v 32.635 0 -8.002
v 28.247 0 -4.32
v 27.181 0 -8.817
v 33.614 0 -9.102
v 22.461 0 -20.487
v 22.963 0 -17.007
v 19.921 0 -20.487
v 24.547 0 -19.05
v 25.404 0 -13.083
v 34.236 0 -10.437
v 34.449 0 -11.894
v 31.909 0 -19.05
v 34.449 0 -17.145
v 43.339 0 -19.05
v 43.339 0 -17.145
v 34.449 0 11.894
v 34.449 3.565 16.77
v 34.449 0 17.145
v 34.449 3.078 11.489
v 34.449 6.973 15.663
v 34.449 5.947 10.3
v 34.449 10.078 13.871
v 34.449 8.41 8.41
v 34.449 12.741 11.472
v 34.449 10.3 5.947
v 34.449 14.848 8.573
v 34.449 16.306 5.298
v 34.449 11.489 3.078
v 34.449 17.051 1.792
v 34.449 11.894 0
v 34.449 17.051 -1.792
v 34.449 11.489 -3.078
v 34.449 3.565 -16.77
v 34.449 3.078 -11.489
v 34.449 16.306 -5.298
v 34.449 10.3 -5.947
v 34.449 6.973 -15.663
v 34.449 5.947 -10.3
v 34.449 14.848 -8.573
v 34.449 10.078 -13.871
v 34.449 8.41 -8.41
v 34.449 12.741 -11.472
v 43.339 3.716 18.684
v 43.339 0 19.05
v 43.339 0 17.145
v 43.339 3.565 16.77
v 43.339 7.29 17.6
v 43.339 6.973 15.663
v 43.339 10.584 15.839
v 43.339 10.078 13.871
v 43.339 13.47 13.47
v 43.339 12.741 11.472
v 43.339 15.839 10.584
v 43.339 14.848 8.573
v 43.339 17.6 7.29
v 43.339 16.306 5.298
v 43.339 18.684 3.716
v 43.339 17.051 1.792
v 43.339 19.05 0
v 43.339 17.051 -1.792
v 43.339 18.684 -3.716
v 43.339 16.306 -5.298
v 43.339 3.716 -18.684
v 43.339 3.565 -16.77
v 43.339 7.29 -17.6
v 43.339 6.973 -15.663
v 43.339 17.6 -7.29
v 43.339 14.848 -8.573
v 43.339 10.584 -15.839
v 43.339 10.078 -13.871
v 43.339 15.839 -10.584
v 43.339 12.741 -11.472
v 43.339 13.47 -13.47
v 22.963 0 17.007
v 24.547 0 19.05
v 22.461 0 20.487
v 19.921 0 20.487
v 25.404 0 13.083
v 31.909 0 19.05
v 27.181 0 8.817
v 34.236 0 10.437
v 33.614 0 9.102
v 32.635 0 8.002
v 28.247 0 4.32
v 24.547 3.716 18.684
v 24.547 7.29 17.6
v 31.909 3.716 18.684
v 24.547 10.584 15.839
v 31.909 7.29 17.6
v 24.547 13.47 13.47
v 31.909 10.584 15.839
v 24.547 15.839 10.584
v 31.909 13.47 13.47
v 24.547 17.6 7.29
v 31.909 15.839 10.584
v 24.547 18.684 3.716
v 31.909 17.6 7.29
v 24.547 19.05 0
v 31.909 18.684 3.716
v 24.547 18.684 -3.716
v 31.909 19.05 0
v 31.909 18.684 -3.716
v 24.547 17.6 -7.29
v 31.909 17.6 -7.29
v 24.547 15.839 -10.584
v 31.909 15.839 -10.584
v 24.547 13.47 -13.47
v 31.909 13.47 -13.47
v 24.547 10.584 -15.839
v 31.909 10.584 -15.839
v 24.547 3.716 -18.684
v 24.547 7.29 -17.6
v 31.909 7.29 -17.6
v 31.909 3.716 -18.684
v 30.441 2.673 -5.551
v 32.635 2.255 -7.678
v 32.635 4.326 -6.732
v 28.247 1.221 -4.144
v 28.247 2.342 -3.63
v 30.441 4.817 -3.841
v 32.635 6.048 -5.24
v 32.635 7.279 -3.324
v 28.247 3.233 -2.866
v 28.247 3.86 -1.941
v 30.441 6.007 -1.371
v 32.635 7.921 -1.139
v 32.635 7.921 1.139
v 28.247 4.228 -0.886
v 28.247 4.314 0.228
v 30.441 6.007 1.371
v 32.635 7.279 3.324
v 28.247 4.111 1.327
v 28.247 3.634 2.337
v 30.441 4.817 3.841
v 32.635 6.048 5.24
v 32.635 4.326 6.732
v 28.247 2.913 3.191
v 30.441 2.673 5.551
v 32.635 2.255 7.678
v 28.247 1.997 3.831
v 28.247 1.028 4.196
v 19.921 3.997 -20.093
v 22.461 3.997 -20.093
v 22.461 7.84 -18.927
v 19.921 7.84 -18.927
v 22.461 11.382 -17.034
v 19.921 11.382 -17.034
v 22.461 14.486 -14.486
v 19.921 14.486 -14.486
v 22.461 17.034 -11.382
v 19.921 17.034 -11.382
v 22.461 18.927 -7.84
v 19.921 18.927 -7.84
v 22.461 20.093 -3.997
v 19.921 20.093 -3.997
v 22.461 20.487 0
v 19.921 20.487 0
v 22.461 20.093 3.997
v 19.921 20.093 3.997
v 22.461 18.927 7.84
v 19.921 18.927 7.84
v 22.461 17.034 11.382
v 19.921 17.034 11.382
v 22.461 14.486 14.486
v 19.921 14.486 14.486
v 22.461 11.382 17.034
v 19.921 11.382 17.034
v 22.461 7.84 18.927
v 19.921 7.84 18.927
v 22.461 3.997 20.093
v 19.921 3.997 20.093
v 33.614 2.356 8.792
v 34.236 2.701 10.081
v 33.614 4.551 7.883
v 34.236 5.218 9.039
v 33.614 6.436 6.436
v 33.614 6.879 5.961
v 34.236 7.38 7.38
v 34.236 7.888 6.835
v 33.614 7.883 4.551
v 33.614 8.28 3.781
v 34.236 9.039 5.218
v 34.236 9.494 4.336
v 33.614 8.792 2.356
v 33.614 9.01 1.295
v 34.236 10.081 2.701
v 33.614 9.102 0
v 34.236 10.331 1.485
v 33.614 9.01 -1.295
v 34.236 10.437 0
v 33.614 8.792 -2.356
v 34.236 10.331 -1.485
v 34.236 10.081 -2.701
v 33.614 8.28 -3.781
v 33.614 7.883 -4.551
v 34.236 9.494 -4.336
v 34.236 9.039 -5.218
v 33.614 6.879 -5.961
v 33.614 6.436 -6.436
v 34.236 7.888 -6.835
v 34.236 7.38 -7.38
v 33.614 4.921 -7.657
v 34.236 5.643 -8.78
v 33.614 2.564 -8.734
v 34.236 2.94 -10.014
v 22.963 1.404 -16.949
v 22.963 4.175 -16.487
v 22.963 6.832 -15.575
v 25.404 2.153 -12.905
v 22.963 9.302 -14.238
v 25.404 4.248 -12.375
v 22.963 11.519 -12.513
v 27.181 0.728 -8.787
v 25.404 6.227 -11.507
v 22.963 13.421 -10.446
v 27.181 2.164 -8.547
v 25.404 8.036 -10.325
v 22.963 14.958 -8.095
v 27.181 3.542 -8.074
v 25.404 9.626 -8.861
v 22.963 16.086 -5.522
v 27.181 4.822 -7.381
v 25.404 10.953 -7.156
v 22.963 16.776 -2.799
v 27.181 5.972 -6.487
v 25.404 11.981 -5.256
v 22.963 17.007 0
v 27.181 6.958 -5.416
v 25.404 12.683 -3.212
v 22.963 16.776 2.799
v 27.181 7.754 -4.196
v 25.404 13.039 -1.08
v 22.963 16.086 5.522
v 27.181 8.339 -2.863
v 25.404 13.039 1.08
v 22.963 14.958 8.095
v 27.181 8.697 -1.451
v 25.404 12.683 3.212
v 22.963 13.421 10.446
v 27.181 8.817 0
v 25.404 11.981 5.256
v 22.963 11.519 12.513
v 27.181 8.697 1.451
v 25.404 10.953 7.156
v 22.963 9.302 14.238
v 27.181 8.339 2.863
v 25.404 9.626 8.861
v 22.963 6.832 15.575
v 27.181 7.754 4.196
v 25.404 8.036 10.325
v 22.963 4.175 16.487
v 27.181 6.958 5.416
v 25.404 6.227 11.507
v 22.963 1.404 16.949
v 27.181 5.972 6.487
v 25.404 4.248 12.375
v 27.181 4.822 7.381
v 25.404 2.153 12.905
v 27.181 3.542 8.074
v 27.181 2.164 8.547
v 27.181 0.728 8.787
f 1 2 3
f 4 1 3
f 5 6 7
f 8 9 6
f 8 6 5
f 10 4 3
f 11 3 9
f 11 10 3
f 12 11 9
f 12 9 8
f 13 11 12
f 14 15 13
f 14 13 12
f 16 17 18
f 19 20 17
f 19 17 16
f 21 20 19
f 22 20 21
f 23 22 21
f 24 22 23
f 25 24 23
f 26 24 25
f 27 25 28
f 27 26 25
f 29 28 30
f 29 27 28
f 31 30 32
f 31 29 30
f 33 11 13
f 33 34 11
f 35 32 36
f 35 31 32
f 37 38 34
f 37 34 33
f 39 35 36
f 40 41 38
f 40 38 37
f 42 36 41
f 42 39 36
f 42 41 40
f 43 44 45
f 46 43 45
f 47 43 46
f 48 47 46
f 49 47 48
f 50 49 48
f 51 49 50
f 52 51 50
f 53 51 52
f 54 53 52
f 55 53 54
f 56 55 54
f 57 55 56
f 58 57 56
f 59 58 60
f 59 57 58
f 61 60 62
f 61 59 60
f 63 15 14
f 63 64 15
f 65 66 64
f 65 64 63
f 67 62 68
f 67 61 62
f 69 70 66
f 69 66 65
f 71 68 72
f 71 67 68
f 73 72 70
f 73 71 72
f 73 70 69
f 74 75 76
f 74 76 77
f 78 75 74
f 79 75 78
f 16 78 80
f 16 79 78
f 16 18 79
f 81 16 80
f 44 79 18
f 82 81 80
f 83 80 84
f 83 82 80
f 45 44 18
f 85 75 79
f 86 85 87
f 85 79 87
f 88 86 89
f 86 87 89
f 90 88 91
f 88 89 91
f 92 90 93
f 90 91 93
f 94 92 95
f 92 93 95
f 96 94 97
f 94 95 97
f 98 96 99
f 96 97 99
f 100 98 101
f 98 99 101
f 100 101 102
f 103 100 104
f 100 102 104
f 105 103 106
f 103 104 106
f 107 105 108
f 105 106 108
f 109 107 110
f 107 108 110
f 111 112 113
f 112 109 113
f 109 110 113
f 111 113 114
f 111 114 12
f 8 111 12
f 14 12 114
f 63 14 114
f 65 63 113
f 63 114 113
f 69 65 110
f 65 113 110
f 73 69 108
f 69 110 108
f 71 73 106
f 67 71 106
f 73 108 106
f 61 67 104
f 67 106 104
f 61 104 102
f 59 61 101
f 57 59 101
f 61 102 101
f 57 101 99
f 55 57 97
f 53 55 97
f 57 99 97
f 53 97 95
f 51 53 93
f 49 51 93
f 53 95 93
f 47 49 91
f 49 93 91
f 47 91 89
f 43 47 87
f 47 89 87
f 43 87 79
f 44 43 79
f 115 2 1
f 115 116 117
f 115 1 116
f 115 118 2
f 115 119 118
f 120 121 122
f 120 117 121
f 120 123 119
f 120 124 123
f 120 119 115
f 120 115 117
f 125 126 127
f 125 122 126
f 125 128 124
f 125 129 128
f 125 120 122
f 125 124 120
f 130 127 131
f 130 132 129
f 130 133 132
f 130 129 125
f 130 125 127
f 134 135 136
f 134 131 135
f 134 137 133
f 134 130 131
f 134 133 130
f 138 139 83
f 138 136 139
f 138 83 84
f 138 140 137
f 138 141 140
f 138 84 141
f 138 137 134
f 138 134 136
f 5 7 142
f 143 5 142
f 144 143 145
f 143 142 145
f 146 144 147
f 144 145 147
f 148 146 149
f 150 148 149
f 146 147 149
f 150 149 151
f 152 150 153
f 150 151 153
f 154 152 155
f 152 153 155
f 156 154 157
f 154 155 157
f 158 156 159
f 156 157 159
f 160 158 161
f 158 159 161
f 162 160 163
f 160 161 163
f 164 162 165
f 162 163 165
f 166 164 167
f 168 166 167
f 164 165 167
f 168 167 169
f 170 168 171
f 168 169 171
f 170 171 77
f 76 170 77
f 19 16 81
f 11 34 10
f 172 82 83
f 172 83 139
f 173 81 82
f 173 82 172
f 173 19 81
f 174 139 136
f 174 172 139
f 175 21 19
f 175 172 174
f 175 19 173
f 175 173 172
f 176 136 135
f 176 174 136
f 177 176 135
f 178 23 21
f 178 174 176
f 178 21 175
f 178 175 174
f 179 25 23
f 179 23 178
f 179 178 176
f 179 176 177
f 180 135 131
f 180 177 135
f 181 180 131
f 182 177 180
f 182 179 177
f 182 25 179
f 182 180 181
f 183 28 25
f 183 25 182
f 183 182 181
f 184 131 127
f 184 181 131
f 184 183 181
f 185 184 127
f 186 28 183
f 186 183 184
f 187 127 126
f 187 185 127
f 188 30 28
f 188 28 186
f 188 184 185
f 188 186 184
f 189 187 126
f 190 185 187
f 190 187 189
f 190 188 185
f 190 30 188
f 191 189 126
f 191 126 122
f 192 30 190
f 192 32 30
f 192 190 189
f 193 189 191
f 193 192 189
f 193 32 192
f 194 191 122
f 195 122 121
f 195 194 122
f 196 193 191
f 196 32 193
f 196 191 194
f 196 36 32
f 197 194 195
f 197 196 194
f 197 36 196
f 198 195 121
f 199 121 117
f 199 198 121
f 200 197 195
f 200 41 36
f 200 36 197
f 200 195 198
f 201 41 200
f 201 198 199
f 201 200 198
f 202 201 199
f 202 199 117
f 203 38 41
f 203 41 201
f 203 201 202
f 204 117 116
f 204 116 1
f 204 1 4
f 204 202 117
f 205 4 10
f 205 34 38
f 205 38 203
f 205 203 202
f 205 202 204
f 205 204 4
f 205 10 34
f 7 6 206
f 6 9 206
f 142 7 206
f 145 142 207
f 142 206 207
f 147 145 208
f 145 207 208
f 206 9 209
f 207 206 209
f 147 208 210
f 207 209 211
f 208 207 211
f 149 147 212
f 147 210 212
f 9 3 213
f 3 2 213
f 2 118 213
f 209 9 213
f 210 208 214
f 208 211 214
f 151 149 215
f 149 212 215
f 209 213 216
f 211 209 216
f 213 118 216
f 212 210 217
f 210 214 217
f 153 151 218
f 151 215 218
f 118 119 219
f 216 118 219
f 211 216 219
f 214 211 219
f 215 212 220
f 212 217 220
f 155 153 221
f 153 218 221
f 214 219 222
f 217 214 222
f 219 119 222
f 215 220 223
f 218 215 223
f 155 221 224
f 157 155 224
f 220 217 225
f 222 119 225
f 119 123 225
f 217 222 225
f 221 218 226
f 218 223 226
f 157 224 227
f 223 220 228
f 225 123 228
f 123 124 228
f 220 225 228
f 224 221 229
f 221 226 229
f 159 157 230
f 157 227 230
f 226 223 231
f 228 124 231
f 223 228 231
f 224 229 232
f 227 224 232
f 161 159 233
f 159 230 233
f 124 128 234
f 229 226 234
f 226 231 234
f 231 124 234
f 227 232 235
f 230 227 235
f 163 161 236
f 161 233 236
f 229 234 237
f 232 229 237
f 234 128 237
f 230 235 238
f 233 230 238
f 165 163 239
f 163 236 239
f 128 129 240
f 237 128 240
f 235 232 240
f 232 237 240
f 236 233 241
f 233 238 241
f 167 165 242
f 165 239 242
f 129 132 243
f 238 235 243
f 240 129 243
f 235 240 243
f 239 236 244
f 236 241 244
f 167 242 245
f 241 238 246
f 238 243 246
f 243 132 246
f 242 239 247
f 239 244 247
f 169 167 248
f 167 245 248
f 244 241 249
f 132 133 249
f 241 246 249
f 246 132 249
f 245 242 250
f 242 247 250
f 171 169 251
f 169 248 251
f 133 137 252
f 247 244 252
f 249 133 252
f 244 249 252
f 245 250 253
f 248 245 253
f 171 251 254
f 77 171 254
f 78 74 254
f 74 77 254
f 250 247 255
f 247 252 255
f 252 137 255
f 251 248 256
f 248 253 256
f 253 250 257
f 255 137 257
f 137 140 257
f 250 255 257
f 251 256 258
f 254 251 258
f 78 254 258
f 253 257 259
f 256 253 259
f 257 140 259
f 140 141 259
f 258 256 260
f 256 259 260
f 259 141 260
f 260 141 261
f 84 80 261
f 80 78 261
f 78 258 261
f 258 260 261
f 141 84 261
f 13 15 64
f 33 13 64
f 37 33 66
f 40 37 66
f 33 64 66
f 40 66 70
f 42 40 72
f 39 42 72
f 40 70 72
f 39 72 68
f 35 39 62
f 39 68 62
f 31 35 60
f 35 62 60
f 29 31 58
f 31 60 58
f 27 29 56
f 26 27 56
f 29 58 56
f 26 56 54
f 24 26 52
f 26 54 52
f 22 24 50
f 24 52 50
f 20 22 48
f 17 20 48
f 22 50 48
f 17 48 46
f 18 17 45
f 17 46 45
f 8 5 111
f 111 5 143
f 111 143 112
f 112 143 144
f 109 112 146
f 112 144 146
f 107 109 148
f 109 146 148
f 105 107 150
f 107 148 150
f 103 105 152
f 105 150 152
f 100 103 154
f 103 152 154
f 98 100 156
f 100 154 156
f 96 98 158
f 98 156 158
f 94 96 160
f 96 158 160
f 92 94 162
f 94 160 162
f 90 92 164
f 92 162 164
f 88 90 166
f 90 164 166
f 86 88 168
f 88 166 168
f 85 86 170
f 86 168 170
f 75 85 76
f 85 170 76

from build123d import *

# Parameters (mm, degrees)
SKETCH5_R               = 19.05
BOSS_EXTRUDE1_DEPTH     = 11.43
BOSS_EXTRUDE4_REACH     = 13.989
SKETCH12_R              = 19.05
SKETCH12_R_2            = 13.981282801
SKETCH11_R              = 17.145
CUT_EXTRUDE5_DEPTH      = 8.89
SKETCH13_R              = 9.525
CUT_EXTRUDE7_DEPTH      = 6.35
CUT_EXTRUDE7_TAPER      = 40
SKETCH14_W              = 44.104776143
SKETCH14_H              = 21.741572172
CUT_EXTRUDE8_DEPTH      = 1
CUT_EXTRUDE8_DEPTH_BACK = 24.418912122
FILLET6_R               = 5.08


with BuildPart() as part:
    # Sketch1 → Revolve4 (revolve)
    with BuildSketch(Plane(origin=(0, 0, 0), x_dir=(1, 0, 0), z_dir=(0, 1, 0))):
        with BuildLine():
            Line((22.460516589, 20.486669906), (19.920516589, 20.486669906))
            ThreePointArc((19.920516589, 20.486669906), (26.322608025, 11.119844052), (28.575, 0))
            Line((28.575, 0), (31.909428711, 0))
            Line((31.909428711, 0), (31.909428711, 13.981282801))
            Line((31.909428711, 13.981282801), (22.460516589, 20.486669906))
        make_face()
    revolve(axis=Axis((28.575, 0, 0), (1, 0, 0)))

    # Sketch5 → Boss-Extrude1 (add)
    with BuildSketch(Plane(origin=(31.909428711, 0, 0), x_dir=(0, 0, -1), z_dir=(1, 0, 0))):
        Circle(SKETCH5_R)
    extrude(amount=BOSS_EXTRUDE1_DEPTH)

    # Sketch12 → Boss-Extrude4 (add, up to next)
    with BuildSketch(Plane.ZY.offset(-31.909428711), mode=Mode.PRIVATE) as boss_extrude4_sk1:
        Circle(SKETCH12_R)
        Circle(SKETCH12_R_2, mode=Mode.SUBTRACT)
    boss_extrude4_tool1 = extrude(boss_extrude4_sk1.sketch, amount=BOSS_EXTRUDE4_REACH, mode=Mode.PRIVATE) - part.part
    add(boss_extrude4_tool1.solids().sort_by_distance((31.909429, 0, -18.511185))[0])

    # Sketch11 → Cut-Extrude5 (cut)
    with BuildSketch(Plane(origin=(43.339428711, 0, 0), x_dir=(0, 0, -1), z_dir=(1, 0, 0))):
        Circle(SKETCH11_R)
    extrude(amount=-CUT_EXTRUDE5_DEPTH, mode=Mode.SUBTRACT)

    # Sketch13 → Cut-Extrude7 (cut)
    with BuildSketch(Plane(origin=(34.449428711, 0, 0), x_dir=(0, 0, -1), z_dir=(1, 0, 0))):
        Circle(SKETCH13_R)
    extrude(amount=-CUT_EXTRUDE7_DEPTH, taper=CUT_EXTRUDE7_TAPER, mode=Mode.SUBTRACT)

    # Sketch14 → Cut-Extrude8 (cut, two sides)
    with BuildSketch(Plane(origin=(43.339428711, 0, 0), x_dir=(0, 0, -1), z_dir=(1, 0, 0))) as cut_extrude8_sk:
        with Locations((0.388519875, -10.870786086)):
            Rectangle(SKETCH14_W, SKETCH14_H)
    extrude(amount=CUT_EXTRUDE8_DEPTH, mode=Mode.SUBTRACT)
    extrude(cut_extrude8_sk.sketch, amount=-CUT_EXTRUDE8_DEPTH_BACK, mode=Mode.SUBTRACT)

    # Fillet6
    fillet6_edges = [part.edges().sort_by_distance(p)[0] for p in [
        (34.449428711, 9.525, 0),
    ]]
    fillet(fillet6_edges, radius=FILLET6_R)


solid = part.part
